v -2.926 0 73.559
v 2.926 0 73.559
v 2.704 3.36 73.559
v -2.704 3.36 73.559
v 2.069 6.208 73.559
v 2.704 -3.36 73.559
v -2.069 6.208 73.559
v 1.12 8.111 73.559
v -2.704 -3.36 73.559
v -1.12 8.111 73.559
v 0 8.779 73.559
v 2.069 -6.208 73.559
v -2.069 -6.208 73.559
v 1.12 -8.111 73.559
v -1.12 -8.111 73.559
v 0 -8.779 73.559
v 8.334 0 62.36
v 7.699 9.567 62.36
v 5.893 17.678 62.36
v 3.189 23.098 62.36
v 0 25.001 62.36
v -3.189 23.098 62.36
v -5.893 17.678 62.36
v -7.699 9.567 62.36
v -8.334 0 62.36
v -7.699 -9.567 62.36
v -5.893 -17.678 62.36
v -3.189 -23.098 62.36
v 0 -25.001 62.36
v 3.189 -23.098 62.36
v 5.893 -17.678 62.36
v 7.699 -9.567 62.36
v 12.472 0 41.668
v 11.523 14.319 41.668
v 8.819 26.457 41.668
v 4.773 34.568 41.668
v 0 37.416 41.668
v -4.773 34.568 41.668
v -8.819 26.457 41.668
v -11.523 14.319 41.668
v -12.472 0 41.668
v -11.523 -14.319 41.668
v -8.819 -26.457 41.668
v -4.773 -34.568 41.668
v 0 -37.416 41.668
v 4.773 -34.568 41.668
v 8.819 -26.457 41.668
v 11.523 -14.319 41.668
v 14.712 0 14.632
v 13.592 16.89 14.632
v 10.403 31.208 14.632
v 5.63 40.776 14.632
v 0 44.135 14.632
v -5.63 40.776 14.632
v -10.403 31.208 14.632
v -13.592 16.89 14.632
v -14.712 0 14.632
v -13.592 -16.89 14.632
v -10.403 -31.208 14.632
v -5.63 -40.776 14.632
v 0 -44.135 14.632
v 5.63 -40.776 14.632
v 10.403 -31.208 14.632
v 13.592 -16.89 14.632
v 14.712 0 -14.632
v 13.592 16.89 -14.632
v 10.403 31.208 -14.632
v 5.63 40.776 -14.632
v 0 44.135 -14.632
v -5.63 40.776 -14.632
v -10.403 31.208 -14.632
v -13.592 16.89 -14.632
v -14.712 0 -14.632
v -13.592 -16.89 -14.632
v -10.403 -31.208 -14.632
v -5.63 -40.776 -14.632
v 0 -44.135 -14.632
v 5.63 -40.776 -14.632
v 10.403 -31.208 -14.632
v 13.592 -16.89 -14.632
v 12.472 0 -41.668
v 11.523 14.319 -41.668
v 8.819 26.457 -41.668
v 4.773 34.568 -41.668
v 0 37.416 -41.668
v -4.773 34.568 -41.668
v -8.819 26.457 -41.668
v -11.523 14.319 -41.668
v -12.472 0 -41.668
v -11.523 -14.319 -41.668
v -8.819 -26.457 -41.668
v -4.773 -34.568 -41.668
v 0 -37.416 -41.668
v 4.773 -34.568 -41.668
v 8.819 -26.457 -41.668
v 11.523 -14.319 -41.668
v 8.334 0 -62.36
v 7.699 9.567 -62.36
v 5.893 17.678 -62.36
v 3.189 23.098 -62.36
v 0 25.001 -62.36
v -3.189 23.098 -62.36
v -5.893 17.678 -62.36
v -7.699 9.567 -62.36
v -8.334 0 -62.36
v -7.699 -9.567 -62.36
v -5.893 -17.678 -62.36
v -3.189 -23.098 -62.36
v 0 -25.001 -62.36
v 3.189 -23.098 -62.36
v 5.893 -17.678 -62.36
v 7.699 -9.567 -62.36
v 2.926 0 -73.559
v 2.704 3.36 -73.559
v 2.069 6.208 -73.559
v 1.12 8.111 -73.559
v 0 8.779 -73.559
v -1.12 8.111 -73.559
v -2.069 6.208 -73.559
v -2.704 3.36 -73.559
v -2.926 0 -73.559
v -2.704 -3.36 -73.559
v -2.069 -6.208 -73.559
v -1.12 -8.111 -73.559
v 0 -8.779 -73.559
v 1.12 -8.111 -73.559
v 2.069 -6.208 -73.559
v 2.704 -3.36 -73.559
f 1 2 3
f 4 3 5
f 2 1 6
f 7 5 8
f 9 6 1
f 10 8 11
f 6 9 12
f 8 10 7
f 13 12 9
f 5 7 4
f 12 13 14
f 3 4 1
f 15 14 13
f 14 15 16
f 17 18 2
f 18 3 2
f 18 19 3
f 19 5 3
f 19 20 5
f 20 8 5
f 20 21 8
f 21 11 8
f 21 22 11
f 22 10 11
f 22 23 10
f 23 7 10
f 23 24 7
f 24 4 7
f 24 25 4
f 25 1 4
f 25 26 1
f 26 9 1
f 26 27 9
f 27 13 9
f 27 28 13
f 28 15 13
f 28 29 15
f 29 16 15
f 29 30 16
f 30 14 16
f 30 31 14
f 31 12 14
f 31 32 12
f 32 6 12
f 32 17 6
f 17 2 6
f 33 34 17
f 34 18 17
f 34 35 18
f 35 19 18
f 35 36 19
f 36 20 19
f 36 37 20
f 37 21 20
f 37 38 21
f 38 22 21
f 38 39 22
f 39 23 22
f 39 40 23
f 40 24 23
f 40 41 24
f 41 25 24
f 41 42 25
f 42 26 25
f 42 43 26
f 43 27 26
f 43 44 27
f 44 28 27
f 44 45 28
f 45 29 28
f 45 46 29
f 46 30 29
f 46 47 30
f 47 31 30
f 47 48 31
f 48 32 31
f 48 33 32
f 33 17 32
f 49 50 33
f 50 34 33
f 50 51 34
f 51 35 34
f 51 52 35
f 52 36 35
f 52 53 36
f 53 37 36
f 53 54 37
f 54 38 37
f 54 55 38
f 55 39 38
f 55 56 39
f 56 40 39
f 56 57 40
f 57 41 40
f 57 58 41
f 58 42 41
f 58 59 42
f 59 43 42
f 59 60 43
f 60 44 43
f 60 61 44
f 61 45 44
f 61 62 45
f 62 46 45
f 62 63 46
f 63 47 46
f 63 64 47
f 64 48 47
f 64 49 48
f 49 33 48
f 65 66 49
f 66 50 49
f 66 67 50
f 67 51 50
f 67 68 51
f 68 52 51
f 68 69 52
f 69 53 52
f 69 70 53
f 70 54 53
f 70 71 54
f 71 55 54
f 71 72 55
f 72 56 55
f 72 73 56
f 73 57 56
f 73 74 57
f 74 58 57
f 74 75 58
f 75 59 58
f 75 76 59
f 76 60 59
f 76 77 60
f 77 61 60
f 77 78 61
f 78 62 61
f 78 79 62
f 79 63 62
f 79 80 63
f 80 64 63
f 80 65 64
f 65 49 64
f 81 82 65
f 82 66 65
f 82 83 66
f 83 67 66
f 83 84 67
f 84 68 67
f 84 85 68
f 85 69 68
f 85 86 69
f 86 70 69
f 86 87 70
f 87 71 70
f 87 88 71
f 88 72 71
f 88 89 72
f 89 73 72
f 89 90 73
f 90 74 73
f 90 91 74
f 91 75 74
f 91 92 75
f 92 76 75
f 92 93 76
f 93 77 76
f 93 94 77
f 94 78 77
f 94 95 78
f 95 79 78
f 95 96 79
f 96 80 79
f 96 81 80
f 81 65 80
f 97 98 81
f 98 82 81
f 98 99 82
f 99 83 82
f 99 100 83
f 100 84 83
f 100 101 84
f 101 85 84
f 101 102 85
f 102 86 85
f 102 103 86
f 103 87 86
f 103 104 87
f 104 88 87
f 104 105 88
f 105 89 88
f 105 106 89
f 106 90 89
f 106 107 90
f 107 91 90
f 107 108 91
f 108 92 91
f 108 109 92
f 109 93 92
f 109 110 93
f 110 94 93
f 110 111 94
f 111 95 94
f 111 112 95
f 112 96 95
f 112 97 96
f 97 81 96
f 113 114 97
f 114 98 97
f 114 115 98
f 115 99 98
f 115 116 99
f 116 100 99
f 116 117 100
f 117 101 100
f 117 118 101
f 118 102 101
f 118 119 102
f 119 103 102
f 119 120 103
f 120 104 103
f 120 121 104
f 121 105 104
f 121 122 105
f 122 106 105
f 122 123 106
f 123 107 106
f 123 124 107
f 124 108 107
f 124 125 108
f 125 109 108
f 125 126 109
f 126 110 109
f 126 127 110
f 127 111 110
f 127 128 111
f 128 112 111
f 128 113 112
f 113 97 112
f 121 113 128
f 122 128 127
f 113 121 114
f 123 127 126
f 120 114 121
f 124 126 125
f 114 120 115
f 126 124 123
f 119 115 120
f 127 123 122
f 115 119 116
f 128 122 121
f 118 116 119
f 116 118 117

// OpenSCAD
// Generated by SolidPython 1.0.1 on 2020-07-29 00:46:45


scale(v = [3, 9, 15]) {
	sphere(r = 5);
}
/***********************************************
*********      SolidPython code:      **********
************************************************
 
# import packages: SolidPython
from solid import *
from solid.utils import *
from itertools import chain, combinations, permutations


class Resize:

    def __init__(self, scad_file):
        self.scad_file = scad_file
        #self.scad_file = import_scad(scad_file)
        # cone/cylinder param:
        self.r1 = 0
        self.r2 = 0
        self.h = 0
        # rectangular prism param:
        self.w = 0
        self.l = 0
        # ellipse param:
        self.r = 0

    # import OpenScad code (file name corresponds to shape)


    # classify shape + parameters
    def assign(self, param1, param2, param3):
        if self.scad_file == 'cone.scad':
            self.r1 = param1
            self.r2 = param2
            self.h = param3
        elif self.scad_file == 'cylinder.scad':
            self.r1 = param1
            self.r2 = param2
            self.h = param3
        elif self.scad_file == 'rectangularPrism.scad':
            self.h = param1
            self.l = param2
            self.w = param3
        else:
            self.r = param1
            self.h = param2

    # resize parameters
    def iterate(self):
        x = range(3, 20, 2)
        i = 1
        if self.scad_file == 'cone.scad':
            tempList = list(permutations(x, 2))
            for temp in tempList:
                param1 = temp[0]
                param2 = temp[1]
                filepath = 'produced_scad_files/' + 'cone' + str(param1) + '_' + str(param2) + '_' + '.scad'
                scad_render_to_file(cylinder(h=param1, r1=param2, r2=0), filepath)

        elif self.scad_file == 'cylinder.scad':
            tempList = list(permutations(x, 3))
            for temp in tempList:
                param1 = temp[0]
                param2 = temp[1]
                filepath = 'produced_scad_files/' + 'cylinder' + str(param1) + '_' + str(param2) + '_' + '.scad'
                scad_render_to_file(cylinder(h=param1, r1=param2, r2=param2), filepath)

        elif self.scad_file == 'rectangularPrism.scad':
            tempList = list(permutations(x, 3))
            for temp in tempList:
                param1 = temp[0]
                param2 = temp[1]
                param3 = temp[2]
                filepath = 'produced_scad_files/' + 'rectangularPrism' + str(param1) + '_' + str(param2) + '_' + str(
                    param3) + '.scad'
                scad_render_to_file(cube(size=(param1, param2, param3)), filepath)

        elif self.scad_file == 'ellipse.scad':
            tempList = list(permutations(x, 4))
            for temp in tempList:
                param1 = temp[0]
                param2 = temp[1]
                param3 = temp[2]
                param4 = temp[3]
                filepath = 'produced_scad_files/' + 'ellipse' + str(param1) + '_' + str(param2) + '_' + str(param3) + '_' + str(param4) + '.scad'
                scad_render_to_file(scale([param1, param2, param3])(sphere(r=param4)), filepath)

    def render_to_scadfile(self):
        scad_render_to_file(scad, 'example.scad') 
 
************************************************/
